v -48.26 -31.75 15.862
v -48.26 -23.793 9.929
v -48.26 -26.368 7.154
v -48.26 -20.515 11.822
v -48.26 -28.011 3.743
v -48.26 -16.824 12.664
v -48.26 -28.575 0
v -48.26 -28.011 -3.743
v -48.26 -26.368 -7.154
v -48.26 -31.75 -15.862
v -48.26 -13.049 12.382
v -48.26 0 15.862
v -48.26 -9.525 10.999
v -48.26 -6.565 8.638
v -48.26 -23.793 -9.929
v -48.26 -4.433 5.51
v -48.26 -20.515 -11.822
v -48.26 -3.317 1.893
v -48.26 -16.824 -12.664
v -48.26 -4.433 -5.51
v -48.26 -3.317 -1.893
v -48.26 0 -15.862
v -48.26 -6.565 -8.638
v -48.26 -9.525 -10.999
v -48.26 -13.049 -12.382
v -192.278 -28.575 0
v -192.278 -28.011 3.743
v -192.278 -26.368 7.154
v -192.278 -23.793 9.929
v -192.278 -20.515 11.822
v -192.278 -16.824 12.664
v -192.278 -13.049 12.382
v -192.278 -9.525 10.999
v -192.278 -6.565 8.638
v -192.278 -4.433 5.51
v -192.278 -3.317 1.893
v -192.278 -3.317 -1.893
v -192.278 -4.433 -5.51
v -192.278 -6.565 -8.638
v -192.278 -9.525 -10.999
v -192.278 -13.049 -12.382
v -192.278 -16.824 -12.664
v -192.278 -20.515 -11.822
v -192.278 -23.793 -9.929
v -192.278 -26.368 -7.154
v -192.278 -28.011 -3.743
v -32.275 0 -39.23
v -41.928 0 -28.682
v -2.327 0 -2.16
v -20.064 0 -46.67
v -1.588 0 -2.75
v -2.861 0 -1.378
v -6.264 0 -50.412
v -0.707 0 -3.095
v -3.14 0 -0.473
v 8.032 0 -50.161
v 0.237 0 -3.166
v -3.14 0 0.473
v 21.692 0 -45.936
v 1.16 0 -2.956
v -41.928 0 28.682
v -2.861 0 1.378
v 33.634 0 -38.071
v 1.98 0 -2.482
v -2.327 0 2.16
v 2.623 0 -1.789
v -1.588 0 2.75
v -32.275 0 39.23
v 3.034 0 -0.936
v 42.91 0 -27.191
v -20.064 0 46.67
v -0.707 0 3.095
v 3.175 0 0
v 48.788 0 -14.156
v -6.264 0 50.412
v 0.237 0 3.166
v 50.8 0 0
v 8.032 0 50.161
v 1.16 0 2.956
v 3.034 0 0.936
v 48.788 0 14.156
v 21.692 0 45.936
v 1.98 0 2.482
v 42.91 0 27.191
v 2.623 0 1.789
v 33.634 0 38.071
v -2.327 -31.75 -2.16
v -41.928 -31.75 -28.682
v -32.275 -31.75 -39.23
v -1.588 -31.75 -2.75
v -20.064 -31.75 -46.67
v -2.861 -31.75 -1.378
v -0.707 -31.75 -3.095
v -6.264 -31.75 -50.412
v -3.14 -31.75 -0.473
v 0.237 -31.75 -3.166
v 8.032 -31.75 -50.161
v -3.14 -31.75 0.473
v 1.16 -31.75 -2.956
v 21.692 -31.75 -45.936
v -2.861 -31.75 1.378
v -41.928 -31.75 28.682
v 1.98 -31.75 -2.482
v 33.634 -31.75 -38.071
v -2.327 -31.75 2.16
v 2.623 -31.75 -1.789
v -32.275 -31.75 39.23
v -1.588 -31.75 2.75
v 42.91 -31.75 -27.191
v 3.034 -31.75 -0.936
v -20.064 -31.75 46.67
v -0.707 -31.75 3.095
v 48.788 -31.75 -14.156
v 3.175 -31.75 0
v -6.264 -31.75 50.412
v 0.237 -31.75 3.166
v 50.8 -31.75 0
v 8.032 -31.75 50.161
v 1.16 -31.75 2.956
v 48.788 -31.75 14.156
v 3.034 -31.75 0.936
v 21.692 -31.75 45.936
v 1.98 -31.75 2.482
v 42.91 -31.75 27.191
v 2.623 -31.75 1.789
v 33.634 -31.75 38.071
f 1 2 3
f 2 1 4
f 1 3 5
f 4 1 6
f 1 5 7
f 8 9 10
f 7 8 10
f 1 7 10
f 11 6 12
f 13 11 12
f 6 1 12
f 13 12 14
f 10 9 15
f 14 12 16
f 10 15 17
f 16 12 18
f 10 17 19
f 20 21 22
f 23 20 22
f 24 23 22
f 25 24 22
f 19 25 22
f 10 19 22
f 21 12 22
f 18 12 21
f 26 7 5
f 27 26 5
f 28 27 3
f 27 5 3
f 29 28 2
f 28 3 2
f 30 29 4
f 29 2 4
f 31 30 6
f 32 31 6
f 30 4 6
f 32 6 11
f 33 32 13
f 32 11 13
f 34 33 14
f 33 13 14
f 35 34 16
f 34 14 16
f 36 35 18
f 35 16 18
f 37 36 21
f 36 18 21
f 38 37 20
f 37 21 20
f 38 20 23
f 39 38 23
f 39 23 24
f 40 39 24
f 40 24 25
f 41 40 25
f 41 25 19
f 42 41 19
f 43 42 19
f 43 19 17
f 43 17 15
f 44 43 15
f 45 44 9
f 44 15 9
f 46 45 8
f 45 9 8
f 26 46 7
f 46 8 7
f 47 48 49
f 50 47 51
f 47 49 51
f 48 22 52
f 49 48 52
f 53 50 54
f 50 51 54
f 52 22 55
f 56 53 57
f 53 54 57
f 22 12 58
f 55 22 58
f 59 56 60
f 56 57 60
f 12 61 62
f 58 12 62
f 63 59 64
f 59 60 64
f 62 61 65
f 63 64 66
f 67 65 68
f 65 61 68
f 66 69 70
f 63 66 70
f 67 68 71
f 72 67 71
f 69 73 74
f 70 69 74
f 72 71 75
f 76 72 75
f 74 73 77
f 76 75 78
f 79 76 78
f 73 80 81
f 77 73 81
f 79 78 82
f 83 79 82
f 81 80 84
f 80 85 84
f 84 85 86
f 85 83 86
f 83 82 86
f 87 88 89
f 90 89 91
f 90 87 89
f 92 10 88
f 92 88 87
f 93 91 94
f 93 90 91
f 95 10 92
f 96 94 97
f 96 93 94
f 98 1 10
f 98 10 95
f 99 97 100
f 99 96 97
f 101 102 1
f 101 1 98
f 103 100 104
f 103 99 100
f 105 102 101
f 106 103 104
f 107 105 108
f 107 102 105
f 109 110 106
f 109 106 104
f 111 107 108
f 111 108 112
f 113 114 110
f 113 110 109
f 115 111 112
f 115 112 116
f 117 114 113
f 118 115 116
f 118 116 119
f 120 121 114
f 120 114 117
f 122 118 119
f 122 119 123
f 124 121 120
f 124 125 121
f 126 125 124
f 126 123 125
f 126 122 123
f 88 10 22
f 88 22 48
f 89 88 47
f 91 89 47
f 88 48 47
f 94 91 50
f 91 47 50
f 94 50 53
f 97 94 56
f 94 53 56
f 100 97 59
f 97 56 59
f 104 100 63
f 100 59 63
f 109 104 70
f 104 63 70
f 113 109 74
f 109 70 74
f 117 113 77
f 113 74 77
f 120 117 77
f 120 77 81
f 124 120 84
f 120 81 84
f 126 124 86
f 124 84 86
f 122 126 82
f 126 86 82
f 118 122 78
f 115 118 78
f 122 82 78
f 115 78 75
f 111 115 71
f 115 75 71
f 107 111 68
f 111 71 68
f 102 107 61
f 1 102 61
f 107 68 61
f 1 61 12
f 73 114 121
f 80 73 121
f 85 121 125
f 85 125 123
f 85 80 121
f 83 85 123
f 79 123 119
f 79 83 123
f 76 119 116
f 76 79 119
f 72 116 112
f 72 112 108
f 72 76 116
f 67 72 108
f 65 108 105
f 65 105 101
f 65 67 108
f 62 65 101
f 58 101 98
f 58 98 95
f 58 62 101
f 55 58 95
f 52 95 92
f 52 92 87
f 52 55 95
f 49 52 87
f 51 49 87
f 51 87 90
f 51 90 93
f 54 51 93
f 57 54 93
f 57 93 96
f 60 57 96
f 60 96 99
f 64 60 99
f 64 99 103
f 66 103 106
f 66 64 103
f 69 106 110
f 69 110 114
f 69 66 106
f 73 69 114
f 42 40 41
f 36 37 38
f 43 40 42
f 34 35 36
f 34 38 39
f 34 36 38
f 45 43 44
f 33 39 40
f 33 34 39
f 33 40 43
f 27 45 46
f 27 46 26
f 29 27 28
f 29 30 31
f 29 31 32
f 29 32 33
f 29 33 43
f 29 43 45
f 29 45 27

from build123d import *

# Parameters (mm, degrees)
F0_R     = 3.175
F1_DEPTH = 31.75
F2_R     = 12.7
F3_DEPTH = 144.018


with BuildPart() as f1:
    # F0 (on Front) → F1 (new body)
    with BuildSketch(Plane.XZ):
        with BuildLine():
            ThreePointArc((-48.26, -15.862295), (8.032185, -50.160981), (50.8, 0))
            ThreePointArc((50.8, 0), (8.032185, 50.160981), (-48.26, 15.862295))
            Line((-48.26, 15.862295), (-48.26, -15.862295))
        make_face()
        Circle(F0_R, mode=Mode.SUBTRACT)
    extrude(amount=F1_DEPTH)

    # F2 (on face) → F3 (join)
    with BuildSketch(Plane(origin=(-48.26, 0, 0), x_dir=(0, -1, 0), z_dir=(-1, 0, 0))):
        with Locations((15.875, 0)):
            Circle(F2_R)
    extrude(amount=F3_DEPTH)


solid = f1.part
